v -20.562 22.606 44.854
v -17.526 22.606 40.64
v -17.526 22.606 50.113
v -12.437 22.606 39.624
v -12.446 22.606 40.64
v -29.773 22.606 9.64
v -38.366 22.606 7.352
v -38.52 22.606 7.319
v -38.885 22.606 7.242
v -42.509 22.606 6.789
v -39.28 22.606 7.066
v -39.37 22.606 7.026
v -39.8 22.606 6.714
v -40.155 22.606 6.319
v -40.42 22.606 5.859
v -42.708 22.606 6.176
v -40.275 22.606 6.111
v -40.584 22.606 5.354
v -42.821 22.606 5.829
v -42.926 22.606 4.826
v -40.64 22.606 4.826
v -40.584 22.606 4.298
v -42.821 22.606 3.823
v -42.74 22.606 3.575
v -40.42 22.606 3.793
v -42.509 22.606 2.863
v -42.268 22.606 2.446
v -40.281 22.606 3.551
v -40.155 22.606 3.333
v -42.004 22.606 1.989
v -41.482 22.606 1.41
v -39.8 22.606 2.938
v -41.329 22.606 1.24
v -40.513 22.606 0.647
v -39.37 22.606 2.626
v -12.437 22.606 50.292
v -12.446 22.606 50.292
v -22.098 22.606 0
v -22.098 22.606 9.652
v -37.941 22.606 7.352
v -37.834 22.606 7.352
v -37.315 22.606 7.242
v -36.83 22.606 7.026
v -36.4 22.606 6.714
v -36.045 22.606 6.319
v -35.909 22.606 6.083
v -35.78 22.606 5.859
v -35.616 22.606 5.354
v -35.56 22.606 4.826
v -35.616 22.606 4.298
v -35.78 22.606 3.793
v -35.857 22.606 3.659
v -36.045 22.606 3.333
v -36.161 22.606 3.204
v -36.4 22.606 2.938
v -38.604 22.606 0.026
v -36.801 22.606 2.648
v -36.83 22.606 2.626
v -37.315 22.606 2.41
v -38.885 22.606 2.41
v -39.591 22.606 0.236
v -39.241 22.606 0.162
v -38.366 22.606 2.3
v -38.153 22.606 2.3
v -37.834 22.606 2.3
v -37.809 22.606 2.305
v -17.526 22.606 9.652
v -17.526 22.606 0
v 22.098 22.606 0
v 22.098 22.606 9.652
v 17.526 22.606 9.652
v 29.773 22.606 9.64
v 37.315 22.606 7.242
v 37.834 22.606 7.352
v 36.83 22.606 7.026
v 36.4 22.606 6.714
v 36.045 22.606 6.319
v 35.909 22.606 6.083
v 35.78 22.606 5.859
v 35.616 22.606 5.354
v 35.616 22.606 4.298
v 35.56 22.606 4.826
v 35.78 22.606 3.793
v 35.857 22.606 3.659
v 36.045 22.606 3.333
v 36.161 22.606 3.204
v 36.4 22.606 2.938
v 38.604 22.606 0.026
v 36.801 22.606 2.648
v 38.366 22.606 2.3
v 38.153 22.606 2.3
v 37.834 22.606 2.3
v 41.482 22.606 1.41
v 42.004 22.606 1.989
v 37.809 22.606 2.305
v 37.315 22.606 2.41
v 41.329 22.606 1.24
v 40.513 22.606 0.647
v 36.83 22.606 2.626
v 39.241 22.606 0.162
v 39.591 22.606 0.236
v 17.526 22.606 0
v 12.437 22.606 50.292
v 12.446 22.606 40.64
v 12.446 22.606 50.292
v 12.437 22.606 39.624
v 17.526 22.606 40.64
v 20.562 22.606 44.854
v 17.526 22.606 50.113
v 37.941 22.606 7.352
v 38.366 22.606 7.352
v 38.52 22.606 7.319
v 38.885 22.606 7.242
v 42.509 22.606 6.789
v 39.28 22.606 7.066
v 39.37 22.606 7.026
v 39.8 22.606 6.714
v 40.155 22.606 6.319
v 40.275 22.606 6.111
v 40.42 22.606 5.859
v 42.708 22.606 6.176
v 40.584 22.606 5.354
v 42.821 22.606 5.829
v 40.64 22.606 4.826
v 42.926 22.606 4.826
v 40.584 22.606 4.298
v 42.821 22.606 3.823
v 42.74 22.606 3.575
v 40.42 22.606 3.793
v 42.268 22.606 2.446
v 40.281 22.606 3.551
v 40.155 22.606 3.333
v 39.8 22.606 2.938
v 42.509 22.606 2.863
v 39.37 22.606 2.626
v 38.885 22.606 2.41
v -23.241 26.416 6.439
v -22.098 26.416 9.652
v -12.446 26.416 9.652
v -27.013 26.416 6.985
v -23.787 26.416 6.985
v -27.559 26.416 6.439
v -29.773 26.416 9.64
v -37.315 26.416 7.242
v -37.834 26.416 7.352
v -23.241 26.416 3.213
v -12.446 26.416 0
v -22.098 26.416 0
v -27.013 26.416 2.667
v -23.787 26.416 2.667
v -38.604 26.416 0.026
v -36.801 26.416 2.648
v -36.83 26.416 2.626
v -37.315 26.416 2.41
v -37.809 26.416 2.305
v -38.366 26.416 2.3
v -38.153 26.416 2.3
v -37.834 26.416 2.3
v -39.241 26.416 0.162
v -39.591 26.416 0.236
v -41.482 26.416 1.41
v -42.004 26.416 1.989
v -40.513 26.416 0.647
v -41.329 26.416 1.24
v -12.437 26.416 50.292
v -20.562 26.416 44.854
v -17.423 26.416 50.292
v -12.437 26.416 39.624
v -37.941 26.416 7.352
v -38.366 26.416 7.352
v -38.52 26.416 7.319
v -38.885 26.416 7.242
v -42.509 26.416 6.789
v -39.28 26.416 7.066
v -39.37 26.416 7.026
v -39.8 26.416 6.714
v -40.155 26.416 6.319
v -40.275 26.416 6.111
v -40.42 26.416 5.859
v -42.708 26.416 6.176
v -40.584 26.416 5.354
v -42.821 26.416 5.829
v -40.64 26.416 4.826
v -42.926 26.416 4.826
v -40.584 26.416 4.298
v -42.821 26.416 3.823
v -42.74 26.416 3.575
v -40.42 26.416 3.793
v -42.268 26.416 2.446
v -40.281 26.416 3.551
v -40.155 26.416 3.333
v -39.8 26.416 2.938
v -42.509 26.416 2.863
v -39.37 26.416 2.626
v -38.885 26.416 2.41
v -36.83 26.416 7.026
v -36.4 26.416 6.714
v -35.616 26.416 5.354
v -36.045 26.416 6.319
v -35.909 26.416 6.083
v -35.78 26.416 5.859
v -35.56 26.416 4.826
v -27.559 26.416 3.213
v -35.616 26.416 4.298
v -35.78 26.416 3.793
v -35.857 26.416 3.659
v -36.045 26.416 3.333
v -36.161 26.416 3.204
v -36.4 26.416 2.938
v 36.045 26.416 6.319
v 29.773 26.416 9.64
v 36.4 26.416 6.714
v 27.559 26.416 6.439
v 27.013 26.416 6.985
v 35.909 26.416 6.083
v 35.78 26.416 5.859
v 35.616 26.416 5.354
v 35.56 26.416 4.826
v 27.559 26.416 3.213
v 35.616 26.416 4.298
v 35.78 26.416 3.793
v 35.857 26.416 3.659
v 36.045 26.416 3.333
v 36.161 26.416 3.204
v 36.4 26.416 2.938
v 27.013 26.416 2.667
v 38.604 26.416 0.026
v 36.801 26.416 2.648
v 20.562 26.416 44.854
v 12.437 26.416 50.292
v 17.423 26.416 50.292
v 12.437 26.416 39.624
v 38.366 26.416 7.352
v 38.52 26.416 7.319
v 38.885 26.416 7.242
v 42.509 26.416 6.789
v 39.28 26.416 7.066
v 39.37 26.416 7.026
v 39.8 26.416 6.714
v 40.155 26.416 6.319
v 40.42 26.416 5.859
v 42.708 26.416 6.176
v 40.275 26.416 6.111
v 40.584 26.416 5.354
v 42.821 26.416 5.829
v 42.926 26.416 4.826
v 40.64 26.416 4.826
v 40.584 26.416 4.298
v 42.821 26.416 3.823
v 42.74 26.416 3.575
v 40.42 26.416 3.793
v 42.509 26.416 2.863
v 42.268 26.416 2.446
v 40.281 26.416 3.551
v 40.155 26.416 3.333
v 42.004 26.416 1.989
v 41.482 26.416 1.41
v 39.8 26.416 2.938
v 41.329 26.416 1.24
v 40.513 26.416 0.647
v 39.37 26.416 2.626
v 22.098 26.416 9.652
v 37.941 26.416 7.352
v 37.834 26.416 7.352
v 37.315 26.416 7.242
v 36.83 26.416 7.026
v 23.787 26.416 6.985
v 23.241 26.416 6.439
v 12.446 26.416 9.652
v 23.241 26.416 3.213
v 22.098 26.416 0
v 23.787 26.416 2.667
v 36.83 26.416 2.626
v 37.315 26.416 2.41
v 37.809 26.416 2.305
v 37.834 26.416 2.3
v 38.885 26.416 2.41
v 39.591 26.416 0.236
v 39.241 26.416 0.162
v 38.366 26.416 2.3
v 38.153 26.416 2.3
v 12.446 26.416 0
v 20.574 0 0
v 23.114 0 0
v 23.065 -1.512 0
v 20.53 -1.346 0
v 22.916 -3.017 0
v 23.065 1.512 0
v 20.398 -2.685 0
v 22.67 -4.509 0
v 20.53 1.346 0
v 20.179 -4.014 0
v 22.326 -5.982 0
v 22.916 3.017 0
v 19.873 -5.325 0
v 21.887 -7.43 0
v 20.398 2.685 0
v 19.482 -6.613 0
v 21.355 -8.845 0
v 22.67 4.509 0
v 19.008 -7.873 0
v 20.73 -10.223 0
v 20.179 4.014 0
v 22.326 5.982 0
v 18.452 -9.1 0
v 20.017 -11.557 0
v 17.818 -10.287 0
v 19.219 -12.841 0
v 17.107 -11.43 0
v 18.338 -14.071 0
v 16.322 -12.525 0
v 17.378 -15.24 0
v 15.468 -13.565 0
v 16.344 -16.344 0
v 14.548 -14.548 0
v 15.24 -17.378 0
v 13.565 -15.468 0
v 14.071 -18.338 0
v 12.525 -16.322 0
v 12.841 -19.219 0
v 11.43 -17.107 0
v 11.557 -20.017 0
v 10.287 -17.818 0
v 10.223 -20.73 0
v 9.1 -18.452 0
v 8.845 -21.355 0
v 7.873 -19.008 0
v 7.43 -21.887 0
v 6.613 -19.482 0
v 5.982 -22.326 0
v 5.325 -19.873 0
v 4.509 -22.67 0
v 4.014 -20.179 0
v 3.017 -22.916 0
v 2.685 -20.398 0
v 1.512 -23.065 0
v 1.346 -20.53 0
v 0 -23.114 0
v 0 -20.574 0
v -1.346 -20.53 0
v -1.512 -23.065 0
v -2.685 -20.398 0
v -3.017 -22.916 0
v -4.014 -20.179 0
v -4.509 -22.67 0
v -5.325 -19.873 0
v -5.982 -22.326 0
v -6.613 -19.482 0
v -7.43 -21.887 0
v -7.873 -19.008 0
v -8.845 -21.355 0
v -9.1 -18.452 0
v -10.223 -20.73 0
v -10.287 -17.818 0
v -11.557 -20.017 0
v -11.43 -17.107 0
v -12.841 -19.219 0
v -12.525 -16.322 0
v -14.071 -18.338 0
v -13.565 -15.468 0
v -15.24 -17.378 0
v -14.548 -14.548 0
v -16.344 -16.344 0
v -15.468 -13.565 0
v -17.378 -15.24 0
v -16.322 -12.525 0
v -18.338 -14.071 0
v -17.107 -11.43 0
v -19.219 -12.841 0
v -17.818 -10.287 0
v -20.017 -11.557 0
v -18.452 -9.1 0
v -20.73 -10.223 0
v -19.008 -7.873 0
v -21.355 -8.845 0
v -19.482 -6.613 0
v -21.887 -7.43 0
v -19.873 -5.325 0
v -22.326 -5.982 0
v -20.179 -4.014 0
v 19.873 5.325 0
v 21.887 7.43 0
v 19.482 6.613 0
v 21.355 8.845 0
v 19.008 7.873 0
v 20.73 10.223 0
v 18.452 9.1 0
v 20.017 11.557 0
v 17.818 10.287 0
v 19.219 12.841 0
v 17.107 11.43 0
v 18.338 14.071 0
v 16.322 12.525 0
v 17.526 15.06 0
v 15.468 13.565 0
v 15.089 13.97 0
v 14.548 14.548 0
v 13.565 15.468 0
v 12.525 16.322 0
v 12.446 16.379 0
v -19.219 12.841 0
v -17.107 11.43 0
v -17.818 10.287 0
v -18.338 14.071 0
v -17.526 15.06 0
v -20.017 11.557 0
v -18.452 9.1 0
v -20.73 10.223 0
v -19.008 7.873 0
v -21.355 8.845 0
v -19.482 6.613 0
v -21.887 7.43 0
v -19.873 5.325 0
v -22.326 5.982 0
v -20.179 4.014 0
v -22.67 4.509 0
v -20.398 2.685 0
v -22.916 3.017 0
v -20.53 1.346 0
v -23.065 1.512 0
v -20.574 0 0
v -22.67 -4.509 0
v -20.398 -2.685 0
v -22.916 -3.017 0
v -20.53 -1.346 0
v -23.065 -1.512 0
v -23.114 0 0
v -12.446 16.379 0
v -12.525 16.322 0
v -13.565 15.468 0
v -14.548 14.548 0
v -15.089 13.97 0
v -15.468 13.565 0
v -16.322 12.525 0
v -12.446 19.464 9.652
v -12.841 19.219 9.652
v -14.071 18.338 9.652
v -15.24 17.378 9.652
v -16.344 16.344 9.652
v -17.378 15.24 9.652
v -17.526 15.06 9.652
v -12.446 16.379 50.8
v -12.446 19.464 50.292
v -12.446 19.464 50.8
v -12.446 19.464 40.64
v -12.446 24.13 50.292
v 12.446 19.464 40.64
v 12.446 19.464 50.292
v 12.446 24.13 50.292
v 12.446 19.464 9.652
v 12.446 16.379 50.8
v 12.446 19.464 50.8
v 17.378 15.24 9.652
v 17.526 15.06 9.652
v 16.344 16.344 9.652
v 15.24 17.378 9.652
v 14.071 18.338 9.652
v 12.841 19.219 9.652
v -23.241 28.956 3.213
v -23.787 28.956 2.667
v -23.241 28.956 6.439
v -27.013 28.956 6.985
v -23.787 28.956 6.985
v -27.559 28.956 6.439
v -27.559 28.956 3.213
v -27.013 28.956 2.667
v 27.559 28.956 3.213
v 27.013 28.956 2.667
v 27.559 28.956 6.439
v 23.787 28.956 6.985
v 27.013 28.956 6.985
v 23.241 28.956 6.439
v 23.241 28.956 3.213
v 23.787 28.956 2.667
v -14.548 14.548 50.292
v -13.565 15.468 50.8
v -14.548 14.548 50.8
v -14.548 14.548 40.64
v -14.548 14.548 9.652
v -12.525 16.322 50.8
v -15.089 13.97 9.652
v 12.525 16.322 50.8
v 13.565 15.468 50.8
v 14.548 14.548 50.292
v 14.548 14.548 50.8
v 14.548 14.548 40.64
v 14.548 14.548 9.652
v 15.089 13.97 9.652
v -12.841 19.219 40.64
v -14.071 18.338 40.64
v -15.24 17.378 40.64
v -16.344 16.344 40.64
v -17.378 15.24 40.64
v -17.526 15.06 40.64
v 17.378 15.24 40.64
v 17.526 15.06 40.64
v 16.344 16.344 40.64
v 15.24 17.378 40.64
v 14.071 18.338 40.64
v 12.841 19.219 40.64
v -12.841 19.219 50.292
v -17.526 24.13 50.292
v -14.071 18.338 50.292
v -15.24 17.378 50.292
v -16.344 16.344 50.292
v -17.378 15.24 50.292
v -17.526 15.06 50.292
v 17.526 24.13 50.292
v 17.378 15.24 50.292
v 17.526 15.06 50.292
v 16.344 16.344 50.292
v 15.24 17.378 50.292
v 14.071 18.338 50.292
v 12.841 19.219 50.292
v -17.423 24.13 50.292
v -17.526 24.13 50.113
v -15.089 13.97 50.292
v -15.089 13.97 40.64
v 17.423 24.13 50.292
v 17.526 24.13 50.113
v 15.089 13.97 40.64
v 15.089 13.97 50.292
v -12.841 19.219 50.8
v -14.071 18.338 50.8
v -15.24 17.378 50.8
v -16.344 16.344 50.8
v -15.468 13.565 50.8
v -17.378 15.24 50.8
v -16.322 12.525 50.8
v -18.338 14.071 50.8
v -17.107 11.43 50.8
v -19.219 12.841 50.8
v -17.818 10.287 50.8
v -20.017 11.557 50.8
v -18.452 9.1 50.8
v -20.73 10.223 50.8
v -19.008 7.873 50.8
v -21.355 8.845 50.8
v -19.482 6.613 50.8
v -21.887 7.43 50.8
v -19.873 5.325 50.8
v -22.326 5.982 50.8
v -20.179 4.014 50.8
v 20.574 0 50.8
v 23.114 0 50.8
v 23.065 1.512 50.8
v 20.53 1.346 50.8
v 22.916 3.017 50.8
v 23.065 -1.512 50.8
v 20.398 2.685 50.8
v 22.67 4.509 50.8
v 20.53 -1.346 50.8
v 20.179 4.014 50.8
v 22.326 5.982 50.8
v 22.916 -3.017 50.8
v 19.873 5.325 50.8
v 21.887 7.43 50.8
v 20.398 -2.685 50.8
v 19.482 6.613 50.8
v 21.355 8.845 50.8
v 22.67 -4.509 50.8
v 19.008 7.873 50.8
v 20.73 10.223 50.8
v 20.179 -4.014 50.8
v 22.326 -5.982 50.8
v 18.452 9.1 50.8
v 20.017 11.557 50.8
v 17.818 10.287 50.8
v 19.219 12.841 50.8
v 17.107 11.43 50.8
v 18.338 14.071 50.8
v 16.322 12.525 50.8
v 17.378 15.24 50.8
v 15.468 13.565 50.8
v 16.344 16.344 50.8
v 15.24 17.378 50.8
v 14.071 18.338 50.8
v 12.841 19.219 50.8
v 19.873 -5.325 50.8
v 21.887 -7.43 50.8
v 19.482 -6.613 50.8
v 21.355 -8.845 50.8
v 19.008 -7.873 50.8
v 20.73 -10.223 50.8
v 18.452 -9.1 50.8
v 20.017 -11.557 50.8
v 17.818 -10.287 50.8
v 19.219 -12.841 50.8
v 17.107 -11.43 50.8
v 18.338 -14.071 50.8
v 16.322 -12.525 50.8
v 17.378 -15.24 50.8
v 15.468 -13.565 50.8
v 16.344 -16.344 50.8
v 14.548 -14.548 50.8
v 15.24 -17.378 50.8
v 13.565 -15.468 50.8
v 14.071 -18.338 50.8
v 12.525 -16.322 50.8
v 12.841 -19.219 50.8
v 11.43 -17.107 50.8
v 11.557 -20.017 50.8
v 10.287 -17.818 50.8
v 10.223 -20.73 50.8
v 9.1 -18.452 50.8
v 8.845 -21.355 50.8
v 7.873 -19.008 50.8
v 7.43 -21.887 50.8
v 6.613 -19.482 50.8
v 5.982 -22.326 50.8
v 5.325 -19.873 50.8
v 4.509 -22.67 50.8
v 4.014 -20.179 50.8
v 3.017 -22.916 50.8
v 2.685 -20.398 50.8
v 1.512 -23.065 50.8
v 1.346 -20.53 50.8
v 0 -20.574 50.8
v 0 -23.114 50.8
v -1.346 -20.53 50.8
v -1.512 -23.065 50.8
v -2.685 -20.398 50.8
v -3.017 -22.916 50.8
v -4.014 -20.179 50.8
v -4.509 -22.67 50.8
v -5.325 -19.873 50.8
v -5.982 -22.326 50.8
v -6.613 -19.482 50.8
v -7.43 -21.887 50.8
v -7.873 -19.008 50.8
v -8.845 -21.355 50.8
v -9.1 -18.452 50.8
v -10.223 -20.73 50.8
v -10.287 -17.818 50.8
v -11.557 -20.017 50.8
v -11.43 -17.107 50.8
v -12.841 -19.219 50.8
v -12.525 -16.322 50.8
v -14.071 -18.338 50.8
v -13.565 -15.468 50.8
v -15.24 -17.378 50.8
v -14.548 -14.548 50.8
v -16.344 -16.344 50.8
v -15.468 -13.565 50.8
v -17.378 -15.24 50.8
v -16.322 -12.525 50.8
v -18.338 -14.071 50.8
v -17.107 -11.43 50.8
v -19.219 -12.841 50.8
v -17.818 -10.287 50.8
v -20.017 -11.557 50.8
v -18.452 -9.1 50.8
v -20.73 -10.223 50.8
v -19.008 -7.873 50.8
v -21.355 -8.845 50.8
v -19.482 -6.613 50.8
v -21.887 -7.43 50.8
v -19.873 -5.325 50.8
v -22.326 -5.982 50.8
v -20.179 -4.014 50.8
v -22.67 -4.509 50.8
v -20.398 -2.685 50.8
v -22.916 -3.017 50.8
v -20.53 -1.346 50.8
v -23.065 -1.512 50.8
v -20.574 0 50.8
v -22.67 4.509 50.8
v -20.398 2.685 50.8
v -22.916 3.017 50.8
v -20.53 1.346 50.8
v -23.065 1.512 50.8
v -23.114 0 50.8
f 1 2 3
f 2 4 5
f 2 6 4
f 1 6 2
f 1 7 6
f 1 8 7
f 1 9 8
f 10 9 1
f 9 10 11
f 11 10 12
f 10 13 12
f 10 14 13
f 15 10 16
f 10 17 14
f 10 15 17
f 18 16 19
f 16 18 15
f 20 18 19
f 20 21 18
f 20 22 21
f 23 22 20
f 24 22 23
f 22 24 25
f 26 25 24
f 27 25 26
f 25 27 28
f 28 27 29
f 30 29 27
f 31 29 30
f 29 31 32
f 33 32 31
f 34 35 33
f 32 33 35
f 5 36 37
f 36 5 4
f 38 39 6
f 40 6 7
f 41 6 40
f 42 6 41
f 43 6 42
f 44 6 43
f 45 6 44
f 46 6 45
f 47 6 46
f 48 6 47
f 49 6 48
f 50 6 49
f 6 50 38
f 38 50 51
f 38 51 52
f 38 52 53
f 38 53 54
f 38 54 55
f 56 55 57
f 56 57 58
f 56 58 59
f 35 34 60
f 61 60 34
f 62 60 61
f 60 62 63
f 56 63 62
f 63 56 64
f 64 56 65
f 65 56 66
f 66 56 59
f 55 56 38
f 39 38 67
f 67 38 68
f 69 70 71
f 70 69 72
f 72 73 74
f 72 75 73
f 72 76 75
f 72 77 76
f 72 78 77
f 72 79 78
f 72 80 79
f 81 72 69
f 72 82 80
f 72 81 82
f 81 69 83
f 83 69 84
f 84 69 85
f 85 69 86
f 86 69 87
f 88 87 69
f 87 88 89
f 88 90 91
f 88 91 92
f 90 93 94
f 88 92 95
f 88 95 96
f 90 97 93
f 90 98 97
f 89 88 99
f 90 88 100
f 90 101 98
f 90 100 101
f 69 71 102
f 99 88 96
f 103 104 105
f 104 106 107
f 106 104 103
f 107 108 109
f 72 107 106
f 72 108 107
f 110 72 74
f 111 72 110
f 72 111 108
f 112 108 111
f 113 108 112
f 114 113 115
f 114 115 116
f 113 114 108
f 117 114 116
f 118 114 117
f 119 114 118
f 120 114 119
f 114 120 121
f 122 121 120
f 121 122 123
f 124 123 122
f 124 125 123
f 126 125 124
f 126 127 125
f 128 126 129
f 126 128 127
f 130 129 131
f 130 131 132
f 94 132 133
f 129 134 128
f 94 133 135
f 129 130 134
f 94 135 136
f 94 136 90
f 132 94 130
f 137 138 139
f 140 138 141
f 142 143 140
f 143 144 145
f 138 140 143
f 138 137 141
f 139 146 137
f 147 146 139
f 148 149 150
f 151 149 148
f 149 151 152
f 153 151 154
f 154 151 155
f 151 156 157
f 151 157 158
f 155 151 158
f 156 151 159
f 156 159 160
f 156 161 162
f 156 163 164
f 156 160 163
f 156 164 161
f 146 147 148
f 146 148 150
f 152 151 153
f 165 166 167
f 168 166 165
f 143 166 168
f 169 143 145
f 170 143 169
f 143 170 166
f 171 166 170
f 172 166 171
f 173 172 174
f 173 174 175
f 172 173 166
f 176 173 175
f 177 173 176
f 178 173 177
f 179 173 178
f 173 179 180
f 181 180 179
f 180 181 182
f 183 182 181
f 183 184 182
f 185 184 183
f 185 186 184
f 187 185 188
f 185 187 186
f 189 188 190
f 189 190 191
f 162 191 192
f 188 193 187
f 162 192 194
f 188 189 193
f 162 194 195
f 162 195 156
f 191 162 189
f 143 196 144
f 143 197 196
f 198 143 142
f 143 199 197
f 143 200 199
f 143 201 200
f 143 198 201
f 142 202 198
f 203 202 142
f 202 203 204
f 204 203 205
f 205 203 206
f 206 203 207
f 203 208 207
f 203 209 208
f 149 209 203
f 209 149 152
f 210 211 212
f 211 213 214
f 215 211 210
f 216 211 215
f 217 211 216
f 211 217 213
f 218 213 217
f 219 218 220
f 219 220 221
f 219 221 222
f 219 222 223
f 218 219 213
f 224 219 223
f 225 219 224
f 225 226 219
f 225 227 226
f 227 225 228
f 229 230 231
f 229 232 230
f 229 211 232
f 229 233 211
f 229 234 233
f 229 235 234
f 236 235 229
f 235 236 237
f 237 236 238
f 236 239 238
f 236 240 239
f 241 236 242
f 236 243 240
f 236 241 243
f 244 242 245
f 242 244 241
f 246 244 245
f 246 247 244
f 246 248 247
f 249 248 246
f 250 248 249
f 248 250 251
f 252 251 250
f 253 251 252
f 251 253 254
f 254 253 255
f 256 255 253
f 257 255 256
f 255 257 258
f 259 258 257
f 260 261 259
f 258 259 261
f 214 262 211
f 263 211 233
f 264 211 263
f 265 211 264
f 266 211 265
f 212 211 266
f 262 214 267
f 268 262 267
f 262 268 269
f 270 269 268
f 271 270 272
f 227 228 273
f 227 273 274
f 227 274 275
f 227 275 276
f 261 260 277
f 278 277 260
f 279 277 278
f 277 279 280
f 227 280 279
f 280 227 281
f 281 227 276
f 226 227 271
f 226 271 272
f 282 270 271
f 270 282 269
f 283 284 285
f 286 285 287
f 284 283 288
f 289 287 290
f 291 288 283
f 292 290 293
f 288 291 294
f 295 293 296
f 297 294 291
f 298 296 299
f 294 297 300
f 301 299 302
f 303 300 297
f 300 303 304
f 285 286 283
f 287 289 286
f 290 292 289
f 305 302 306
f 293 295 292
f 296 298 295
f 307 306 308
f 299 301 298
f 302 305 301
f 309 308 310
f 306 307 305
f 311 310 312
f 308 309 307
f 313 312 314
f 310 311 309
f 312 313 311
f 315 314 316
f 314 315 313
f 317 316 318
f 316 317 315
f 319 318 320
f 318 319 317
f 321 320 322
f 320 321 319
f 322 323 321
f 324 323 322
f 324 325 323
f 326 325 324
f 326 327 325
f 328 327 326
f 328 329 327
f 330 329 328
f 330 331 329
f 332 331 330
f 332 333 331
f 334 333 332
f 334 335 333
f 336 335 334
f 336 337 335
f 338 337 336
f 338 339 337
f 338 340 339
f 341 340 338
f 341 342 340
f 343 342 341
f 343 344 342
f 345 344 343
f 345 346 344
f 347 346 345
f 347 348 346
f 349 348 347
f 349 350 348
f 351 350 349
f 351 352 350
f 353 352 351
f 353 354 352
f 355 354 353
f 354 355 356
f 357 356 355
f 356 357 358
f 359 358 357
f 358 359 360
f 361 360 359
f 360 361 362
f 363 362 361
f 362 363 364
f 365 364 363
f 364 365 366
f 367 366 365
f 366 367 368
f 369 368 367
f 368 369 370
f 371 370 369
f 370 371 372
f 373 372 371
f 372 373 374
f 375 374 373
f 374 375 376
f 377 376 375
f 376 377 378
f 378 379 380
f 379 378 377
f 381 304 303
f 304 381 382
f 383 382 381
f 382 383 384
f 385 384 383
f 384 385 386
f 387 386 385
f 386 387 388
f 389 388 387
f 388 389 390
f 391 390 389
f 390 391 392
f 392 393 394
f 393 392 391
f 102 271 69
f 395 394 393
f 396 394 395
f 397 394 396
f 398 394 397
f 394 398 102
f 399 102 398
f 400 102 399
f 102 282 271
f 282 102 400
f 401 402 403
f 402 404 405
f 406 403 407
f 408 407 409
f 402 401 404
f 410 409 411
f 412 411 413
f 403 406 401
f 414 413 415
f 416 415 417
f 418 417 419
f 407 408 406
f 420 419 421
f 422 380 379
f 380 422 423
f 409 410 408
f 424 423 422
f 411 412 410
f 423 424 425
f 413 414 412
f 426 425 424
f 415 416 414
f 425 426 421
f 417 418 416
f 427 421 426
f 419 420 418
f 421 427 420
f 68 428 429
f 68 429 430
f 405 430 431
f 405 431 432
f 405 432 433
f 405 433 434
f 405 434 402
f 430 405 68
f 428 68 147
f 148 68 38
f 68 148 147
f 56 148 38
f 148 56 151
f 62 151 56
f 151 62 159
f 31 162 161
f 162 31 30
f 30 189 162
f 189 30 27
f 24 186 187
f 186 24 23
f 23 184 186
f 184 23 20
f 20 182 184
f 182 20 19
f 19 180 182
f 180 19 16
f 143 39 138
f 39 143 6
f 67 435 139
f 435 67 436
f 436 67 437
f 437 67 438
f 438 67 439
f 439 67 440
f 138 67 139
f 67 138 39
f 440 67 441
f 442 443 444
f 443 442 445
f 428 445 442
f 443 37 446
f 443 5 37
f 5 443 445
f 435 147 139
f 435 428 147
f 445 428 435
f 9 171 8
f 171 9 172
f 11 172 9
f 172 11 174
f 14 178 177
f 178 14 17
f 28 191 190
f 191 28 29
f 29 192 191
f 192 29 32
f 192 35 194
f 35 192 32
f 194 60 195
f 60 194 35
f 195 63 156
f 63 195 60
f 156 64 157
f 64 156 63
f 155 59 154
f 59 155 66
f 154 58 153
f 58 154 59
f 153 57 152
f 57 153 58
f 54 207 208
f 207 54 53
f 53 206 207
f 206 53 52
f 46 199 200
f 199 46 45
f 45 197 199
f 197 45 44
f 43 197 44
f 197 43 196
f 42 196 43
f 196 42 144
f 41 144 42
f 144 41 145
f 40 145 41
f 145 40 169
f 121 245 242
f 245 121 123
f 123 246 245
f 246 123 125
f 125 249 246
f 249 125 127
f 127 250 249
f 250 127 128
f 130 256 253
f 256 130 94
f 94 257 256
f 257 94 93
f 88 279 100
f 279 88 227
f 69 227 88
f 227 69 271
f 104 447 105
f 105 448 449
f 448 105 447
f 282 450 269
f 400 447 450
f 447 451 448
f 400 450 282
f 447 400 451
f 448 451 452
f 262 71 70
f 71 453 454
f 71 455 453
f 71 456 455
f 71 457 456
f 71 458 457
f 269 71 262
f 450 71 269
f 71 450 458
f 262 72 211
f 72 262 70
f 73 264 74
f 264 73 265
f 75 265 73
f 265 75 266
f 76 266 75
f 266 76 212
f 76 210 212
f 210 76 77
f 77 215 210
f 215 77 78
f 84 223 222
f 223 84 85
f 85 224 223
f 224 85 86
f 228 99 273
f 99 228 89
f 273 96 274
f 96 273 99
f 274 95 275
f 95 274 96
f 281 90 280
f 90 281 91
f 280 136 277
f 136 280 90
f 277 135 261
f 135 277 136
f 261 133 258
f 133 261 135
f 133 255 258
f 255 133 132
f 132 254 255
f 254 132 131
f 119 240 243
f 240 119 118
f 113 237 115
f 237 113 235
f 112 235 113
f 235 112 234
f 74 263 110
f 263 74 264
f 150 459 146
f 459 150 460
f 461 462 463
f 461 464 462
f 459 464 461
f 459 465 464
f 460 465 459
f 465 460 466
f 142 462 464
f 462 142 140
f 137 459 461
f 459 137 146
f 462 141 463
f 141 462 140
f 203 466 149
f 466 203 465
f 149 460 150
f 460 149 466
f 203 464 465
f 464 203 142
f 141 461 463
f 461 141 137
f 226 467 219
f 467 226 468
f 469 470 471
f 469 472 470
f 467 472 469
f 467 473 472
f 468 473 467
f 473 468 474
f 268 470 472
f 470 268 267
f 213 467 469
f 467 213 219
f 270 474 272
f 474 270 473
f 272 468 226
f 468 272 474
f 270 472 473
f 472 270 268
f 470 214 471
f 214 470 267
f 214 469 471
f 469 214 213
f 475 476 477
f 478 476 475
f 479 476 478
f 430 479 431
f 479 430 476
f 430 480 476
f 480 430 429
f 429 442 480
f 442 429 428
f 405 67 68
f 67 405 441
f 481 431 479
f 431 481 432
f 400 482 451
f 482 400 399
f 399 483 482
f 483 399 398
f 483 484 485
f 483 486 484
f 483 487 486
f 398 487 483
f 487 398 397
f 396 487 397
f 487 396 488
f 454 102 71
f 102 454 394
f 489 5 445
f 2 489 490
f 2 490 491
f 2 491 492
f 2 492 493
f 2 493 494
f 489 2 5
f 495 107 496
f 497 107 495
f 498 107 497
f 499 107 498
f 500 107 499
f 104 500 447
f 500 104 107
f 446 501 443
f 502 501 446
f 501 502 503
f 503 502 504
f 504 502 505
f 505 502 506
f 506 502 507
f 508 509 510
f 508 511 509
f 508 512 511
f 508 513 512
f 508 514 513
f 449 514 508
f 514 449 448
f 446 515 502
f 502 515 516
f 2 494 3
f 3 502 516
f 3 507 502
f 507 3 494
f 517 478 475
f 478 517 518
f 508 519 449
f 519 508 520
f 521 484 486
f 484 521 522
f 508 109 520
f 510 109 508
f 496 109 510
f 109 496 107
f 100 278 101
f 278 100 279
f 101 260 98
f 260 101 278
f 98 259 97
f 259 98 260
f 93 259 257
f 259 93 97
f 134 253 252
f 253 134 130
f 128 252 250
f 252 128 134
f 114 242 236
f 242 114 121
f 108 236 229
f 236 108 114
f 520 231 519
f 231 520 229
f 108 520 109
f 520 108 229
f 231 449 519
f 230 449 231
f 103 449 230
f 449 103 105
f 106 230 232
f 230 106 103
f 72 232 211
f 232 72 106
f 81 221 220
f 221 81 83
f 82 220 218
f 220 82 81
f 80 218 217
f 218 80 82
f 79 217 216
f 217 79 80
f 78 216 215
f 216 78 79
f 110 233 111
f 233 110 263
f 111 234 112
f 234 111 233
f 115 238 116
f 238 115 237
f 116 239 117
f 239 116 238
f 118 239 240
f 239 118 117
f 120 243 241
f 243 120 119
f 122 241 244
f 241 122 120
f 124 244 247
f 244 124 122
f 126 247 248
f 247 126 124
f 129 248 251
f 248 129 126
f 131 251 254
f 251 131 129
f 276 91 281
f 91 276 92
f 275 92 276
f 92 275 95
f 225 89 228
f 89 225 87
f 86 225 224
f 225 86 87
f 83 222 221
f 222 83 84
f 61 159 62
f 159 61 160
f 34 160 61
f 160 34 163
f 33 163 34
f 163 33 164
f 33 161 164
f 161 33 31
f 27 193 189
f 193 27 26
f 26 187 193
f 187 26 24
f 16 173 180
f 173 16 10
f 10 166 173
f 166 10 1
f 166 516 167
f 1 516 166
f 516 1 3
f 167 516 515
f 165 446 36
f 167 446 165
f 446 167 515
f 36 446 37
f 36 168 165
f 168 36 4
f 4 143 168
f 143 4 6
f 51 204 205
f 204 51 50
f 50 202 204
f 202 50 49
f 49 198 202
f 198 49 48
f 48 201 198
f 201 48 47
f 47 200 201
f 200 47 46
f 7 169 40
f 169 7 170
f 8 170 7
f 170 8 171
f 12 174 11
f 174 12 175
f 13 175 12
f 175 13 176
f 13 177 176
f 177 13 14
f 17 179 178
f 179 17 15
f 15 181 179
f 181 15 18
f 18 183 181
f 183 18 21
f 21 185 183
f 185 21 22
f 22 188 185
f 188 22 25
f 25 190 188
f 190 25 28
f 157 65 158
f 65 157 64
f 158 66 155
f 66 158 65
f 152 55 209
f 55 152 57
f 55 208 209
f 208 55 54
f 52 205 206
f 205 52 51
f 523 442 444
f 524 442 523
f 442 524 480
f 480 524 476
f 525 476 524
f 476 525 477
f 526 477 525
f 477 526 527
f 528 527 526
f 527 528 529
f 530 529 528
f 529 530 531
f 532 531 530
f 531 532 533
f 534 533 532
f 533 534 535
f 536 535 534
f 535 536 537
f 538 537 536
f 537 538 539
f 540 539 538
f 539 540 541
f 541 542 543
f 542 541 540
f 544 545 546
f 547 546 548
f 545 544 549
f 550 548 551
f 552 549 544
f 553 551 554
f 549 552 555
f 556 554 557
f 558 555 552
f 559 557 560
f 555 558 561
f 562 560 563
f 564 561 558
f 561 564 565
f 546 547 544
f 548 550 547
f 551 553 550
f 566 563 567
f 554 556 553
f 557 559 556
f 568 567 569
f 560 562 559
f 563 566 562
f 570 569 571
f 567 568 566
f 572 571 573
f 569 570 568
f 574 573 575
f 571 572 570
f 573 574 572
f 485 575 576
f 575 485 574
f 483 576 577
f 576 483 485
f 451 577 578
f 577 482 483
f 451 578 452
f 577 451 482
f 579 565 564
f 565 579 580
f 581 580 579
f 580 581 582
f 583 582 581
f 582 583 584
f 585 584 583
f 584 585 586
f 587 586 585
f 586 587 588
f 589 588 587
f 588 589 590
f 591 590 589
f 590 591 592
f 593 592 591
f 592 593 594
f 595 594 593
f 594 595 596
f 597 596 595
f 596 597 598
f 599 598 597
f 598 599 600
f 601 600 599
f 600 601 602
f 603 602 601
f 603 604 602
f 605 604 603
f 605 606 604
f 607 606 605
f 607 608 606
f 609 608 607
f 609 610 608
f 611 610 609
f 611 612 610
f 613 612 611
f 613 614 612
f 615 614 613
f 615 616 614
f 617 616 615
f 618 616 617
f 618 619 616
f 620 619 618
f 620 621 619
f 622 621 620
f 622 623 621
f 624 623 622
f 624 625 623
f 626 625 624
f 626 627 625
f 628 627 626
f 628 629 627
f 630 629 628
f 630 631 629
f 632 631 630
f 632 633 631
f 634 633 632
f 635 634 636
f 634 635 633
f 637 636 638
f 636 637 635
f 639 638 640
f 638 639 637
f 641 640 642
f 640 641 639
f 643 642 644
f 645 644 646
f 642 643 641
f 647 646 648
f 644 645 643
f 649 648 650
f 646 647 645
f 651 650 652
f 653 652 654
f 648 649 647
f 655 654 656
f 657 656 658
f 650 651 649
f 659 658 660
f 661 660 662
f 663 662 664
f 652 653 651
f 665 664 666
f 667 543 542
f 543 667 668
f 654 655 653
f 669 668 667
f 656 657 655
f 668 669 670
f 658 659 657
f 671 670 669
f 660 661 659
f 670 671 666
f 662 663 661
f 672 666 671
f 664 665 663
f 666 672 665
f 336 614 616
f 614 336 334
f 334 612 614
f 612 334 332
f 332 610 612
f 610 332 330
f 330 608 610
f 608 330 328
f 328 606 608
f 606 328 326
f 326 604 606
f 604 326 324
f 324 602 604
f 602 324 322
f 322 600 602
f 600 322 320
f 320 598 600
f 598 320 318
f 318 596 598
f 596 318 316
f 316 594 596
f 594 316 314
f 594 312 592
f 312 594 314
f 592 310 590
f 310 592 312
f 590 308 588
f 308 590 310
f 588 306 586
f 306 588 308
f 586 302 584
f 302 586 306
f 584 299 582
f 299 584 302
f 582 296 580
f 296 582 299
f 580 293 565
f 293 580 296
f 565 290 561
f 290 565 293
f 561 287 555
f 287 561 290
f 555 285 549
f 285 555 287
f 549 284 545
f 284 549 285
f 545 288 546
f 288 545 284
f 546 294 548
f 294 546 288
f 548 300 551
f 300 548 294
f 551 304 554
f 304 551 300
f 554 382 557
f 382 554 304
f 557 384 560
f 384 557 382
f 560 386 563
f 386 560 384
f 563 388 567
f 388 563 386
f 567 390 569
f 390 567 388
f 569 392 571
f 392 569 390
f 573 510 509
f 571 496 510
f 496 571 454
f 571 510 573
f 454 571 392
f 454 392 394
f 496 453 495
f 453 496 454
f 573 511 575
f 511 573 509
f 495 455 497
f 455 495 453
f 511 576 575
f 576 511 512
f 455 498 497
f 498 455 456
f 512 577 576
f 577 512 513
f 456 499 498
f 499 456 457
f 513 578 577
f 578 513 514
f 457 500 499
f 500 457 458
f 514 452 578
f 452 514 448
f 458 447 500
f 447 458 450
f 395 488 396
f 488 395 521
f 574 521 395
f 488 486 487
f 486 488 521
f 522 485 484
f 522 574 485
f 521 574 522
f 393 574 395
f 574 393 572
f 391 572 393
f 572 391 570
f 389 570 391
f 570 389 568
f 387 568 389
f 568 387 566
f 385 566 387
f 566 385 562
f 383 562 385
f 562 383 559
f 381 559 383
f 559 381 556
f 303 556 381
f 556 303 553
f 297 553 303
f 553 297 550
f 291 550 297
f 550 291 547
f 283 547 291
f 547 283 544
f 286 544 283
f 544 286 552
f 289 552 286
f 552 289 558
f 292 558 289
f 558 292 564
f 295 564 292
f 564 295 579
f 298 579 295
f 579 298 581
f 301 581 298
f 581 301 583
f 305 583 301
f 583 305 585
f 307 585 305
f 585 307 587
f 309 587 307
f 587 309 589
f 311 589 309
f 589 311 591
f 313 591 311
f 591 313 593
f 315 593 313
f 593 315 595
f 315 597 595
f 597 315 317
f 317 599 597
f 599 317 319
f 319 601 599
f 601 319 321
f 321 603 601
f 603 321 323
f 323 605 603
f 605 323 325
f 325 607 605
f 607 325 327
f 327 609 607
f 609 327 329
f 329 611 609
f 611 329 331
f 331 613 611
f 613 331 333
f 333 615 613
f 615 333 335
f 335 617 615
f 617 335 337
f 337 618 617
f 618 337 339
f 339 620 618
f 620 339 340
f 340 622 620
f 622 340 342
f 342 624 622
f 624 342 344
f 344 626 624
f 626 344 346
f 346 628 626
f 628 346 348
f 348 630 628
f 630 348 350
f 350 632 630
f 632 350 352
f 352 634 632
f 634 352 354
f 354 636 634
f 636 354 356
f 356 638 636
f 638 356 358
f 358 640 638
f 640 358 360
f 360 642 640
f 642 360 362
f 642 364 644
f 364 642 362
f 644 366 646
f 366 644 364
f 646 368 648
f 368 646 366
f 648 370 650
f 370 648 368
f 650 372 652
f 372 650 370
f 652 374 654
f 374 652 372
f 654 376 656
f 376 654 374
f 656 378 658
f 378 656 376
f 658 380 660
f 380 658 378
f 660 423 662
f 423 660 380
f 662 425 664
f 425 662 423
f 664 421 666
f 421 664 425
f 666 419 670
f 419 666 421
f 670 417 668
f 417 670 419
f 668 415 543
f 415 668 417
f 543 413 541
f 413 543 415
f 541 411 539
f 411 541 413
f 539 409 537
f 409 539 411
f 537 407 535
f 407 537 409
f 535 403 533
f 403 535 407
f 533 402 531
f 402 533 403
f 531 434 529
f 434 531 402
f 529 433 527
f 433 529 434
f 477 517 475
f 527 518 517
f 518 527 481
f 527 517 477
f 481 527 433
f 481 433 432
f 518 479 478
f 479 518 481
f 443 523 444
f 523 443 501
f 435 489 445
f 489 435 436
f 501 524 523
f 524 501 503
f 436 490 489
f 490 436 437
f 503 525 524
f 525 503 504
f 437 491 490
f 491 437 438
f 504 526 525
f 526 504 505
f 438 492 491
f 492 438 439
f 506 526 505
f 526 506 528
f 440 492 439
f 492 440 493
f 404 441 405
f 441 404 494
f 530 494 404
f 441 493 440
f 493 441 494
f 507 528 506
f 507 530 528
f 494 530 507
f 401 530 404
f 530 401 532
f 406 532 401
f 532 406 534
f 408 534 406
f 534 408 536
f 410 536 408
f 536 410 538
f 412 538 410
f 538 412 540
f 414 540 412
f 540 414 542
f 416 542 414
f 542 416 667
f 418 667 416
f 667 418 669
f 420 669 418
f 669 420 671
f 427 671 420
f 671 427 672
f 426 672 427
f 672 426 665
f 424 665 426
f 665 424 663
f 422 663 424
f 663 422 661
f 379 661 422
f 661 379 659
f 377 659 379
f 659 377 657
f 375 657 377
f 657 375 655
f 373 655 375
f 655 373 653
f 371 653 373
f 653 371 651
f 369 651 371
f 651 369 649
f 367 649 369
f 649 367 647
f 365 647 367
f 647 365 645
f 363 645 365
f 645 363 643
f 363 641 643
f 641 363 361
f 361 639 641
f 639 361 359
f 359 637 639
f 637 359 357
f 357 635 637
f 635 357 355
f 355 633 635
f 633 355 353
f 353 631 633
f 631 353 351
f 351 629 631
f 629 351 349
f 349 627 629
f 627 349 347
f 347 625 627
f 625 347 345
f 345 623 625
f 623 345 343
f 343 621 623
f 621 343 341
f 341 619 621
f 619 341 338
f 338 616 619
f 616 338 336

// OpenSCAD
ViewScale = [0.0254, 0.0254, 0.0254];

module cutouts()
{
   difference() {
        circle(1600/2, $fn=96);
        circle(1490/2, $fn=96);
        // tab
        rotate([0, 0, 45]) 
        translate([0, 700, 0])
        square([200, 200], center=true);
        // tab
        rotate([0, 0, 165]) 
        translate([0, 700, 0])
        square([200, 200], center=true);
        // tab
        rotate([0, 0, 285]) 
        translate([0, 700, 0])
        square([200, 200], center=true);
    }
}

module cutouts2()
{
   difference() {
        circle(1600/2, $fn=96);
        circle(1490/2, $fn=96);
        // tab
        rotate([0, 0, 53]) 
        translate([0, 700, 0])
        square([400, 200], center=true);
        // tab
        rotate([0, 0, 173]) 
        translate([0, 700, 0])
        square([400, 200], center=true);
        // tab
        //#rotate([0, 0, 240]) 
        rotate([0, 0, 293]) 
        translate([0, 700, 0])
        square([400, 200], center=true);
    }
}

module bodymain()
{
    difference() {
        circle(1600/2, $fn=96);
        circle(1400/2, $fn=96);
    }
}

//module bodycutout()
//{
//    difference() {
//        circle(1460/2, $fn=96);
//        circle(1360/2, $fn=96);
//        *square([1020, 1020], center=true);
//        translate([0, 700, 0])
//        square([400, 200], center=true);
//        scale([1.3,1.3,1.3])
//        translate([0, 500, 0])
//        square([400, 200], center=true);
//        //rotcutouts();
//    }
//}

module bodycutout2()
{
    difference() {
        circle(1460/2, $fn=96);
        circle(1360/2, $fn=96);
        scale([1.3,1.3,1.3])
        translate([0, 500, 0])
        square([400, 200], center=true);
        //rotcutouts();
    }
}

//module ledframe2()
//{
//    difference() {
//    square([1030, 1030], center=true);
//    square([800, 800], center=true);
//    rotcutouts();
////    translate([0, 500, 0])
////    square([400, 200], center=true);
//    }
//}
//
//module ledframe1()
//{
//    difference() {
//        square([1030, 1030], center=true);
//        square([900, 900], center=true);
//        rotcutouts();
//    }
//}

//module support()
//{
//    difference() {
//    square([860, 860], center=true);
//    square([760, 760], center=true);
//    }
//}

module mirror()
{
    translate([-525/2, 0, 500])
    rotate([135, 0, 0]) {
        translate([-10, 0, -500]) {
        linear_extrude(1000)
        difference() {
            square([545, 164]);
            translate([94/2, 0, 0])
            square([445, 114]);
        }
        translate([0, 0, 1000])
        linear_extrude(50)
        square([525, 164]);
    }}
}

module cap() 
{
    difference() {
        circle(1600/2, $fn=96);
        square([455, 870], center=true);
    }
}

module vexmount1()
{
    difference() {
        hull() {
            circle(380/2);
            translate([820, 0, 0])
            square([380, 380], center=true);
        }
        circle(200/2);
    }
}

module bump()
{
    linear_extrude(100)
    difference() {
    square([170, 170], center=true);
    for(ii=[45:90:315]) {
        rotate([0, 0, ii])
        translate([0, 120, 0])
        square([80, 30], center=true);
    }}
}

module vexmount()
{
    linear_extrude(150) {
        vexmount1();
        translate([3000, 0, 0])
        rotate([0, 180, 0])
        vexmount1();
    }
    translate([500, 0, 150])
    bump();
    translate([2500, 0, 150])
    bump();
}

module mountsupport()
{
    difference() {
        translate([0, 650, 0])
        union() {
            translate([-590, 100, 0])
            square([200, 400], center=true);
            translate([590, 100, 0])
            square([200, 400], center=true);
        }
        circle(1620/2, $fn=96);
    }
}

module mirrormountgrooves()
{
    difference() {
        difference() {
            circle(1820/2, $fn=96);
            circle(1620/2, $fn=96);
        }
        for(ii=[30:30:360])
        {
            rotate([0, 0, ii])
            translate([850, 0, 0])
            square([200, 300], center=true);
        }
    }
}

module mirrormounttabs()
{
    intersection() {
    difference() {
        circle(1800/2, $fn=96);
        circle(1600/2, $fn=96);
    }
    for(ii=[30:120:270]){
        rotate([0, 0, ii])
        translate([880, 0, 0])
        square([200, 280], center=true);
    }}
}

module adjmirrormount()
{
    translate([0, 0, 0])
    linear_extrude(150)
    cutouts();

    translate([0, 0, 150])
    linear_extrude(150)
    cutouts2();

    translate([0, 0, 300])
    linear_extrude(200)
    bodymain();

    translate([0, 0, 500])
    linear_extrude(50)
    cap();

    translate([0, 0, 300])
    mirror();

    *translate([0, 0, 0])
    rotate([-90, 0, 0])
    vexmount();

    *translate([0, 0, 110])
    linear_extrude(380)
    mountsupport();

    linear_extrude(1000)
    mirrormounttabs();
}


module tab()
{
    // tab big bit
    *linear_extrude(160)
    intersection() {
        difference() {
            circle(1660/2, $fn=96);
            circle(1460/2, $fn=96);
        }
        rotate([0, 0, 52]) 
        translate([0, 700, 0])
        square([380, 260], center=true);
    }
    //translate([0, 0, 160])
    // tab little bit
    linear_extrude(130)
    intersection() {
        difference() {
            circle(1600/2, $fn=96);
            circle(1460/2, $fn=96);
        }
        rotate([0, 0, 45]) 
        translate([0, 700, 0])
        square([180, 300], center=true);
    }
}

module tabs()
{
    tab();
    rotate([0, 0, 120])
    tab();
    rotate([0, 0, 240])
    tab();
}

module tabbedlensmount() 
{
    // base
    linear_extrude(1000)
    difference() {
        circle(1460/2, $fn=96);
        circle(1360/2, $fn=96);
    }

    // support1
    *linear_extrude(970)
    difference() {
        circle(1330/2, $fn=96);
        circle(1180/2, $fn=96);
    }

    // support2
    *linear_extrude(970)
    difference() {
        circle(1150/2, $fn=96);
        circle(1000/2, $fn=96);
    }

    translate([0, 0, 1000])
    linear_extrude(50)
    difference() {
        circle(1460/2, $fn=96);
        circle(1010/2, $fn=96);
    }

    translate([0, 0, 1050])
    linear_extrude(300) {
        difference() {
            circle(1110/2, $fn=96);
            circle(1010/2, $fn=96);
        }
    }
    translate([0, 0, 10])
    tabs();
}

module diagonal()
{
    translate([1500, 1040, 190])
    rotate([90, 60, 0])
    linear_extrude(150)
    difference() {
        hull() {
            circle(380/2);
            translate([-1900, 0, 0])
            square([380, 380], center=true);
        }
        circle(200/2);
        translate([-2105, -240, 0])
        rotate([0,0,60]) {
        square([500, 700],center=true);
        translate([400, 237, 0])
        square([500, 300],center=true);
        }
    }
}

module adjvexmount()
{
    translate([-1500, 890, 190])
    rotate([-90, 0, 0])
    vexmount();

    //translate([0, 140, 0])
    // lower support
    linear_extrude(380)
    mountsupport();

    // upper support
    translate([0, 0, 1600])
    linear_extrude(380)
    mountsupport();

    // diagonalsupport
    diagonal();
    translate([0, 1930, 0])
    rotate([0, 0, 180])
    diagonal();

    linear_extrude(2000)
    difference() {
        circle(1820/2, $fn=96);
        circle(1620/2, $fn=96);
        translate([0, 800, 0])
        square([980, 400], center=true);
    //    mirrormountgrooves();
    }
    *linear_extrude(1000)
    mirrormountgrooves();
}

scale(ViewScale)
{
    //translate([2000, 0, 0])
    *adjmirrormount();
    adjvexmount();
    //translate([0, 0, 300])
    //rotate([180, 0, 45])
    *tabbedlensmount();
}
